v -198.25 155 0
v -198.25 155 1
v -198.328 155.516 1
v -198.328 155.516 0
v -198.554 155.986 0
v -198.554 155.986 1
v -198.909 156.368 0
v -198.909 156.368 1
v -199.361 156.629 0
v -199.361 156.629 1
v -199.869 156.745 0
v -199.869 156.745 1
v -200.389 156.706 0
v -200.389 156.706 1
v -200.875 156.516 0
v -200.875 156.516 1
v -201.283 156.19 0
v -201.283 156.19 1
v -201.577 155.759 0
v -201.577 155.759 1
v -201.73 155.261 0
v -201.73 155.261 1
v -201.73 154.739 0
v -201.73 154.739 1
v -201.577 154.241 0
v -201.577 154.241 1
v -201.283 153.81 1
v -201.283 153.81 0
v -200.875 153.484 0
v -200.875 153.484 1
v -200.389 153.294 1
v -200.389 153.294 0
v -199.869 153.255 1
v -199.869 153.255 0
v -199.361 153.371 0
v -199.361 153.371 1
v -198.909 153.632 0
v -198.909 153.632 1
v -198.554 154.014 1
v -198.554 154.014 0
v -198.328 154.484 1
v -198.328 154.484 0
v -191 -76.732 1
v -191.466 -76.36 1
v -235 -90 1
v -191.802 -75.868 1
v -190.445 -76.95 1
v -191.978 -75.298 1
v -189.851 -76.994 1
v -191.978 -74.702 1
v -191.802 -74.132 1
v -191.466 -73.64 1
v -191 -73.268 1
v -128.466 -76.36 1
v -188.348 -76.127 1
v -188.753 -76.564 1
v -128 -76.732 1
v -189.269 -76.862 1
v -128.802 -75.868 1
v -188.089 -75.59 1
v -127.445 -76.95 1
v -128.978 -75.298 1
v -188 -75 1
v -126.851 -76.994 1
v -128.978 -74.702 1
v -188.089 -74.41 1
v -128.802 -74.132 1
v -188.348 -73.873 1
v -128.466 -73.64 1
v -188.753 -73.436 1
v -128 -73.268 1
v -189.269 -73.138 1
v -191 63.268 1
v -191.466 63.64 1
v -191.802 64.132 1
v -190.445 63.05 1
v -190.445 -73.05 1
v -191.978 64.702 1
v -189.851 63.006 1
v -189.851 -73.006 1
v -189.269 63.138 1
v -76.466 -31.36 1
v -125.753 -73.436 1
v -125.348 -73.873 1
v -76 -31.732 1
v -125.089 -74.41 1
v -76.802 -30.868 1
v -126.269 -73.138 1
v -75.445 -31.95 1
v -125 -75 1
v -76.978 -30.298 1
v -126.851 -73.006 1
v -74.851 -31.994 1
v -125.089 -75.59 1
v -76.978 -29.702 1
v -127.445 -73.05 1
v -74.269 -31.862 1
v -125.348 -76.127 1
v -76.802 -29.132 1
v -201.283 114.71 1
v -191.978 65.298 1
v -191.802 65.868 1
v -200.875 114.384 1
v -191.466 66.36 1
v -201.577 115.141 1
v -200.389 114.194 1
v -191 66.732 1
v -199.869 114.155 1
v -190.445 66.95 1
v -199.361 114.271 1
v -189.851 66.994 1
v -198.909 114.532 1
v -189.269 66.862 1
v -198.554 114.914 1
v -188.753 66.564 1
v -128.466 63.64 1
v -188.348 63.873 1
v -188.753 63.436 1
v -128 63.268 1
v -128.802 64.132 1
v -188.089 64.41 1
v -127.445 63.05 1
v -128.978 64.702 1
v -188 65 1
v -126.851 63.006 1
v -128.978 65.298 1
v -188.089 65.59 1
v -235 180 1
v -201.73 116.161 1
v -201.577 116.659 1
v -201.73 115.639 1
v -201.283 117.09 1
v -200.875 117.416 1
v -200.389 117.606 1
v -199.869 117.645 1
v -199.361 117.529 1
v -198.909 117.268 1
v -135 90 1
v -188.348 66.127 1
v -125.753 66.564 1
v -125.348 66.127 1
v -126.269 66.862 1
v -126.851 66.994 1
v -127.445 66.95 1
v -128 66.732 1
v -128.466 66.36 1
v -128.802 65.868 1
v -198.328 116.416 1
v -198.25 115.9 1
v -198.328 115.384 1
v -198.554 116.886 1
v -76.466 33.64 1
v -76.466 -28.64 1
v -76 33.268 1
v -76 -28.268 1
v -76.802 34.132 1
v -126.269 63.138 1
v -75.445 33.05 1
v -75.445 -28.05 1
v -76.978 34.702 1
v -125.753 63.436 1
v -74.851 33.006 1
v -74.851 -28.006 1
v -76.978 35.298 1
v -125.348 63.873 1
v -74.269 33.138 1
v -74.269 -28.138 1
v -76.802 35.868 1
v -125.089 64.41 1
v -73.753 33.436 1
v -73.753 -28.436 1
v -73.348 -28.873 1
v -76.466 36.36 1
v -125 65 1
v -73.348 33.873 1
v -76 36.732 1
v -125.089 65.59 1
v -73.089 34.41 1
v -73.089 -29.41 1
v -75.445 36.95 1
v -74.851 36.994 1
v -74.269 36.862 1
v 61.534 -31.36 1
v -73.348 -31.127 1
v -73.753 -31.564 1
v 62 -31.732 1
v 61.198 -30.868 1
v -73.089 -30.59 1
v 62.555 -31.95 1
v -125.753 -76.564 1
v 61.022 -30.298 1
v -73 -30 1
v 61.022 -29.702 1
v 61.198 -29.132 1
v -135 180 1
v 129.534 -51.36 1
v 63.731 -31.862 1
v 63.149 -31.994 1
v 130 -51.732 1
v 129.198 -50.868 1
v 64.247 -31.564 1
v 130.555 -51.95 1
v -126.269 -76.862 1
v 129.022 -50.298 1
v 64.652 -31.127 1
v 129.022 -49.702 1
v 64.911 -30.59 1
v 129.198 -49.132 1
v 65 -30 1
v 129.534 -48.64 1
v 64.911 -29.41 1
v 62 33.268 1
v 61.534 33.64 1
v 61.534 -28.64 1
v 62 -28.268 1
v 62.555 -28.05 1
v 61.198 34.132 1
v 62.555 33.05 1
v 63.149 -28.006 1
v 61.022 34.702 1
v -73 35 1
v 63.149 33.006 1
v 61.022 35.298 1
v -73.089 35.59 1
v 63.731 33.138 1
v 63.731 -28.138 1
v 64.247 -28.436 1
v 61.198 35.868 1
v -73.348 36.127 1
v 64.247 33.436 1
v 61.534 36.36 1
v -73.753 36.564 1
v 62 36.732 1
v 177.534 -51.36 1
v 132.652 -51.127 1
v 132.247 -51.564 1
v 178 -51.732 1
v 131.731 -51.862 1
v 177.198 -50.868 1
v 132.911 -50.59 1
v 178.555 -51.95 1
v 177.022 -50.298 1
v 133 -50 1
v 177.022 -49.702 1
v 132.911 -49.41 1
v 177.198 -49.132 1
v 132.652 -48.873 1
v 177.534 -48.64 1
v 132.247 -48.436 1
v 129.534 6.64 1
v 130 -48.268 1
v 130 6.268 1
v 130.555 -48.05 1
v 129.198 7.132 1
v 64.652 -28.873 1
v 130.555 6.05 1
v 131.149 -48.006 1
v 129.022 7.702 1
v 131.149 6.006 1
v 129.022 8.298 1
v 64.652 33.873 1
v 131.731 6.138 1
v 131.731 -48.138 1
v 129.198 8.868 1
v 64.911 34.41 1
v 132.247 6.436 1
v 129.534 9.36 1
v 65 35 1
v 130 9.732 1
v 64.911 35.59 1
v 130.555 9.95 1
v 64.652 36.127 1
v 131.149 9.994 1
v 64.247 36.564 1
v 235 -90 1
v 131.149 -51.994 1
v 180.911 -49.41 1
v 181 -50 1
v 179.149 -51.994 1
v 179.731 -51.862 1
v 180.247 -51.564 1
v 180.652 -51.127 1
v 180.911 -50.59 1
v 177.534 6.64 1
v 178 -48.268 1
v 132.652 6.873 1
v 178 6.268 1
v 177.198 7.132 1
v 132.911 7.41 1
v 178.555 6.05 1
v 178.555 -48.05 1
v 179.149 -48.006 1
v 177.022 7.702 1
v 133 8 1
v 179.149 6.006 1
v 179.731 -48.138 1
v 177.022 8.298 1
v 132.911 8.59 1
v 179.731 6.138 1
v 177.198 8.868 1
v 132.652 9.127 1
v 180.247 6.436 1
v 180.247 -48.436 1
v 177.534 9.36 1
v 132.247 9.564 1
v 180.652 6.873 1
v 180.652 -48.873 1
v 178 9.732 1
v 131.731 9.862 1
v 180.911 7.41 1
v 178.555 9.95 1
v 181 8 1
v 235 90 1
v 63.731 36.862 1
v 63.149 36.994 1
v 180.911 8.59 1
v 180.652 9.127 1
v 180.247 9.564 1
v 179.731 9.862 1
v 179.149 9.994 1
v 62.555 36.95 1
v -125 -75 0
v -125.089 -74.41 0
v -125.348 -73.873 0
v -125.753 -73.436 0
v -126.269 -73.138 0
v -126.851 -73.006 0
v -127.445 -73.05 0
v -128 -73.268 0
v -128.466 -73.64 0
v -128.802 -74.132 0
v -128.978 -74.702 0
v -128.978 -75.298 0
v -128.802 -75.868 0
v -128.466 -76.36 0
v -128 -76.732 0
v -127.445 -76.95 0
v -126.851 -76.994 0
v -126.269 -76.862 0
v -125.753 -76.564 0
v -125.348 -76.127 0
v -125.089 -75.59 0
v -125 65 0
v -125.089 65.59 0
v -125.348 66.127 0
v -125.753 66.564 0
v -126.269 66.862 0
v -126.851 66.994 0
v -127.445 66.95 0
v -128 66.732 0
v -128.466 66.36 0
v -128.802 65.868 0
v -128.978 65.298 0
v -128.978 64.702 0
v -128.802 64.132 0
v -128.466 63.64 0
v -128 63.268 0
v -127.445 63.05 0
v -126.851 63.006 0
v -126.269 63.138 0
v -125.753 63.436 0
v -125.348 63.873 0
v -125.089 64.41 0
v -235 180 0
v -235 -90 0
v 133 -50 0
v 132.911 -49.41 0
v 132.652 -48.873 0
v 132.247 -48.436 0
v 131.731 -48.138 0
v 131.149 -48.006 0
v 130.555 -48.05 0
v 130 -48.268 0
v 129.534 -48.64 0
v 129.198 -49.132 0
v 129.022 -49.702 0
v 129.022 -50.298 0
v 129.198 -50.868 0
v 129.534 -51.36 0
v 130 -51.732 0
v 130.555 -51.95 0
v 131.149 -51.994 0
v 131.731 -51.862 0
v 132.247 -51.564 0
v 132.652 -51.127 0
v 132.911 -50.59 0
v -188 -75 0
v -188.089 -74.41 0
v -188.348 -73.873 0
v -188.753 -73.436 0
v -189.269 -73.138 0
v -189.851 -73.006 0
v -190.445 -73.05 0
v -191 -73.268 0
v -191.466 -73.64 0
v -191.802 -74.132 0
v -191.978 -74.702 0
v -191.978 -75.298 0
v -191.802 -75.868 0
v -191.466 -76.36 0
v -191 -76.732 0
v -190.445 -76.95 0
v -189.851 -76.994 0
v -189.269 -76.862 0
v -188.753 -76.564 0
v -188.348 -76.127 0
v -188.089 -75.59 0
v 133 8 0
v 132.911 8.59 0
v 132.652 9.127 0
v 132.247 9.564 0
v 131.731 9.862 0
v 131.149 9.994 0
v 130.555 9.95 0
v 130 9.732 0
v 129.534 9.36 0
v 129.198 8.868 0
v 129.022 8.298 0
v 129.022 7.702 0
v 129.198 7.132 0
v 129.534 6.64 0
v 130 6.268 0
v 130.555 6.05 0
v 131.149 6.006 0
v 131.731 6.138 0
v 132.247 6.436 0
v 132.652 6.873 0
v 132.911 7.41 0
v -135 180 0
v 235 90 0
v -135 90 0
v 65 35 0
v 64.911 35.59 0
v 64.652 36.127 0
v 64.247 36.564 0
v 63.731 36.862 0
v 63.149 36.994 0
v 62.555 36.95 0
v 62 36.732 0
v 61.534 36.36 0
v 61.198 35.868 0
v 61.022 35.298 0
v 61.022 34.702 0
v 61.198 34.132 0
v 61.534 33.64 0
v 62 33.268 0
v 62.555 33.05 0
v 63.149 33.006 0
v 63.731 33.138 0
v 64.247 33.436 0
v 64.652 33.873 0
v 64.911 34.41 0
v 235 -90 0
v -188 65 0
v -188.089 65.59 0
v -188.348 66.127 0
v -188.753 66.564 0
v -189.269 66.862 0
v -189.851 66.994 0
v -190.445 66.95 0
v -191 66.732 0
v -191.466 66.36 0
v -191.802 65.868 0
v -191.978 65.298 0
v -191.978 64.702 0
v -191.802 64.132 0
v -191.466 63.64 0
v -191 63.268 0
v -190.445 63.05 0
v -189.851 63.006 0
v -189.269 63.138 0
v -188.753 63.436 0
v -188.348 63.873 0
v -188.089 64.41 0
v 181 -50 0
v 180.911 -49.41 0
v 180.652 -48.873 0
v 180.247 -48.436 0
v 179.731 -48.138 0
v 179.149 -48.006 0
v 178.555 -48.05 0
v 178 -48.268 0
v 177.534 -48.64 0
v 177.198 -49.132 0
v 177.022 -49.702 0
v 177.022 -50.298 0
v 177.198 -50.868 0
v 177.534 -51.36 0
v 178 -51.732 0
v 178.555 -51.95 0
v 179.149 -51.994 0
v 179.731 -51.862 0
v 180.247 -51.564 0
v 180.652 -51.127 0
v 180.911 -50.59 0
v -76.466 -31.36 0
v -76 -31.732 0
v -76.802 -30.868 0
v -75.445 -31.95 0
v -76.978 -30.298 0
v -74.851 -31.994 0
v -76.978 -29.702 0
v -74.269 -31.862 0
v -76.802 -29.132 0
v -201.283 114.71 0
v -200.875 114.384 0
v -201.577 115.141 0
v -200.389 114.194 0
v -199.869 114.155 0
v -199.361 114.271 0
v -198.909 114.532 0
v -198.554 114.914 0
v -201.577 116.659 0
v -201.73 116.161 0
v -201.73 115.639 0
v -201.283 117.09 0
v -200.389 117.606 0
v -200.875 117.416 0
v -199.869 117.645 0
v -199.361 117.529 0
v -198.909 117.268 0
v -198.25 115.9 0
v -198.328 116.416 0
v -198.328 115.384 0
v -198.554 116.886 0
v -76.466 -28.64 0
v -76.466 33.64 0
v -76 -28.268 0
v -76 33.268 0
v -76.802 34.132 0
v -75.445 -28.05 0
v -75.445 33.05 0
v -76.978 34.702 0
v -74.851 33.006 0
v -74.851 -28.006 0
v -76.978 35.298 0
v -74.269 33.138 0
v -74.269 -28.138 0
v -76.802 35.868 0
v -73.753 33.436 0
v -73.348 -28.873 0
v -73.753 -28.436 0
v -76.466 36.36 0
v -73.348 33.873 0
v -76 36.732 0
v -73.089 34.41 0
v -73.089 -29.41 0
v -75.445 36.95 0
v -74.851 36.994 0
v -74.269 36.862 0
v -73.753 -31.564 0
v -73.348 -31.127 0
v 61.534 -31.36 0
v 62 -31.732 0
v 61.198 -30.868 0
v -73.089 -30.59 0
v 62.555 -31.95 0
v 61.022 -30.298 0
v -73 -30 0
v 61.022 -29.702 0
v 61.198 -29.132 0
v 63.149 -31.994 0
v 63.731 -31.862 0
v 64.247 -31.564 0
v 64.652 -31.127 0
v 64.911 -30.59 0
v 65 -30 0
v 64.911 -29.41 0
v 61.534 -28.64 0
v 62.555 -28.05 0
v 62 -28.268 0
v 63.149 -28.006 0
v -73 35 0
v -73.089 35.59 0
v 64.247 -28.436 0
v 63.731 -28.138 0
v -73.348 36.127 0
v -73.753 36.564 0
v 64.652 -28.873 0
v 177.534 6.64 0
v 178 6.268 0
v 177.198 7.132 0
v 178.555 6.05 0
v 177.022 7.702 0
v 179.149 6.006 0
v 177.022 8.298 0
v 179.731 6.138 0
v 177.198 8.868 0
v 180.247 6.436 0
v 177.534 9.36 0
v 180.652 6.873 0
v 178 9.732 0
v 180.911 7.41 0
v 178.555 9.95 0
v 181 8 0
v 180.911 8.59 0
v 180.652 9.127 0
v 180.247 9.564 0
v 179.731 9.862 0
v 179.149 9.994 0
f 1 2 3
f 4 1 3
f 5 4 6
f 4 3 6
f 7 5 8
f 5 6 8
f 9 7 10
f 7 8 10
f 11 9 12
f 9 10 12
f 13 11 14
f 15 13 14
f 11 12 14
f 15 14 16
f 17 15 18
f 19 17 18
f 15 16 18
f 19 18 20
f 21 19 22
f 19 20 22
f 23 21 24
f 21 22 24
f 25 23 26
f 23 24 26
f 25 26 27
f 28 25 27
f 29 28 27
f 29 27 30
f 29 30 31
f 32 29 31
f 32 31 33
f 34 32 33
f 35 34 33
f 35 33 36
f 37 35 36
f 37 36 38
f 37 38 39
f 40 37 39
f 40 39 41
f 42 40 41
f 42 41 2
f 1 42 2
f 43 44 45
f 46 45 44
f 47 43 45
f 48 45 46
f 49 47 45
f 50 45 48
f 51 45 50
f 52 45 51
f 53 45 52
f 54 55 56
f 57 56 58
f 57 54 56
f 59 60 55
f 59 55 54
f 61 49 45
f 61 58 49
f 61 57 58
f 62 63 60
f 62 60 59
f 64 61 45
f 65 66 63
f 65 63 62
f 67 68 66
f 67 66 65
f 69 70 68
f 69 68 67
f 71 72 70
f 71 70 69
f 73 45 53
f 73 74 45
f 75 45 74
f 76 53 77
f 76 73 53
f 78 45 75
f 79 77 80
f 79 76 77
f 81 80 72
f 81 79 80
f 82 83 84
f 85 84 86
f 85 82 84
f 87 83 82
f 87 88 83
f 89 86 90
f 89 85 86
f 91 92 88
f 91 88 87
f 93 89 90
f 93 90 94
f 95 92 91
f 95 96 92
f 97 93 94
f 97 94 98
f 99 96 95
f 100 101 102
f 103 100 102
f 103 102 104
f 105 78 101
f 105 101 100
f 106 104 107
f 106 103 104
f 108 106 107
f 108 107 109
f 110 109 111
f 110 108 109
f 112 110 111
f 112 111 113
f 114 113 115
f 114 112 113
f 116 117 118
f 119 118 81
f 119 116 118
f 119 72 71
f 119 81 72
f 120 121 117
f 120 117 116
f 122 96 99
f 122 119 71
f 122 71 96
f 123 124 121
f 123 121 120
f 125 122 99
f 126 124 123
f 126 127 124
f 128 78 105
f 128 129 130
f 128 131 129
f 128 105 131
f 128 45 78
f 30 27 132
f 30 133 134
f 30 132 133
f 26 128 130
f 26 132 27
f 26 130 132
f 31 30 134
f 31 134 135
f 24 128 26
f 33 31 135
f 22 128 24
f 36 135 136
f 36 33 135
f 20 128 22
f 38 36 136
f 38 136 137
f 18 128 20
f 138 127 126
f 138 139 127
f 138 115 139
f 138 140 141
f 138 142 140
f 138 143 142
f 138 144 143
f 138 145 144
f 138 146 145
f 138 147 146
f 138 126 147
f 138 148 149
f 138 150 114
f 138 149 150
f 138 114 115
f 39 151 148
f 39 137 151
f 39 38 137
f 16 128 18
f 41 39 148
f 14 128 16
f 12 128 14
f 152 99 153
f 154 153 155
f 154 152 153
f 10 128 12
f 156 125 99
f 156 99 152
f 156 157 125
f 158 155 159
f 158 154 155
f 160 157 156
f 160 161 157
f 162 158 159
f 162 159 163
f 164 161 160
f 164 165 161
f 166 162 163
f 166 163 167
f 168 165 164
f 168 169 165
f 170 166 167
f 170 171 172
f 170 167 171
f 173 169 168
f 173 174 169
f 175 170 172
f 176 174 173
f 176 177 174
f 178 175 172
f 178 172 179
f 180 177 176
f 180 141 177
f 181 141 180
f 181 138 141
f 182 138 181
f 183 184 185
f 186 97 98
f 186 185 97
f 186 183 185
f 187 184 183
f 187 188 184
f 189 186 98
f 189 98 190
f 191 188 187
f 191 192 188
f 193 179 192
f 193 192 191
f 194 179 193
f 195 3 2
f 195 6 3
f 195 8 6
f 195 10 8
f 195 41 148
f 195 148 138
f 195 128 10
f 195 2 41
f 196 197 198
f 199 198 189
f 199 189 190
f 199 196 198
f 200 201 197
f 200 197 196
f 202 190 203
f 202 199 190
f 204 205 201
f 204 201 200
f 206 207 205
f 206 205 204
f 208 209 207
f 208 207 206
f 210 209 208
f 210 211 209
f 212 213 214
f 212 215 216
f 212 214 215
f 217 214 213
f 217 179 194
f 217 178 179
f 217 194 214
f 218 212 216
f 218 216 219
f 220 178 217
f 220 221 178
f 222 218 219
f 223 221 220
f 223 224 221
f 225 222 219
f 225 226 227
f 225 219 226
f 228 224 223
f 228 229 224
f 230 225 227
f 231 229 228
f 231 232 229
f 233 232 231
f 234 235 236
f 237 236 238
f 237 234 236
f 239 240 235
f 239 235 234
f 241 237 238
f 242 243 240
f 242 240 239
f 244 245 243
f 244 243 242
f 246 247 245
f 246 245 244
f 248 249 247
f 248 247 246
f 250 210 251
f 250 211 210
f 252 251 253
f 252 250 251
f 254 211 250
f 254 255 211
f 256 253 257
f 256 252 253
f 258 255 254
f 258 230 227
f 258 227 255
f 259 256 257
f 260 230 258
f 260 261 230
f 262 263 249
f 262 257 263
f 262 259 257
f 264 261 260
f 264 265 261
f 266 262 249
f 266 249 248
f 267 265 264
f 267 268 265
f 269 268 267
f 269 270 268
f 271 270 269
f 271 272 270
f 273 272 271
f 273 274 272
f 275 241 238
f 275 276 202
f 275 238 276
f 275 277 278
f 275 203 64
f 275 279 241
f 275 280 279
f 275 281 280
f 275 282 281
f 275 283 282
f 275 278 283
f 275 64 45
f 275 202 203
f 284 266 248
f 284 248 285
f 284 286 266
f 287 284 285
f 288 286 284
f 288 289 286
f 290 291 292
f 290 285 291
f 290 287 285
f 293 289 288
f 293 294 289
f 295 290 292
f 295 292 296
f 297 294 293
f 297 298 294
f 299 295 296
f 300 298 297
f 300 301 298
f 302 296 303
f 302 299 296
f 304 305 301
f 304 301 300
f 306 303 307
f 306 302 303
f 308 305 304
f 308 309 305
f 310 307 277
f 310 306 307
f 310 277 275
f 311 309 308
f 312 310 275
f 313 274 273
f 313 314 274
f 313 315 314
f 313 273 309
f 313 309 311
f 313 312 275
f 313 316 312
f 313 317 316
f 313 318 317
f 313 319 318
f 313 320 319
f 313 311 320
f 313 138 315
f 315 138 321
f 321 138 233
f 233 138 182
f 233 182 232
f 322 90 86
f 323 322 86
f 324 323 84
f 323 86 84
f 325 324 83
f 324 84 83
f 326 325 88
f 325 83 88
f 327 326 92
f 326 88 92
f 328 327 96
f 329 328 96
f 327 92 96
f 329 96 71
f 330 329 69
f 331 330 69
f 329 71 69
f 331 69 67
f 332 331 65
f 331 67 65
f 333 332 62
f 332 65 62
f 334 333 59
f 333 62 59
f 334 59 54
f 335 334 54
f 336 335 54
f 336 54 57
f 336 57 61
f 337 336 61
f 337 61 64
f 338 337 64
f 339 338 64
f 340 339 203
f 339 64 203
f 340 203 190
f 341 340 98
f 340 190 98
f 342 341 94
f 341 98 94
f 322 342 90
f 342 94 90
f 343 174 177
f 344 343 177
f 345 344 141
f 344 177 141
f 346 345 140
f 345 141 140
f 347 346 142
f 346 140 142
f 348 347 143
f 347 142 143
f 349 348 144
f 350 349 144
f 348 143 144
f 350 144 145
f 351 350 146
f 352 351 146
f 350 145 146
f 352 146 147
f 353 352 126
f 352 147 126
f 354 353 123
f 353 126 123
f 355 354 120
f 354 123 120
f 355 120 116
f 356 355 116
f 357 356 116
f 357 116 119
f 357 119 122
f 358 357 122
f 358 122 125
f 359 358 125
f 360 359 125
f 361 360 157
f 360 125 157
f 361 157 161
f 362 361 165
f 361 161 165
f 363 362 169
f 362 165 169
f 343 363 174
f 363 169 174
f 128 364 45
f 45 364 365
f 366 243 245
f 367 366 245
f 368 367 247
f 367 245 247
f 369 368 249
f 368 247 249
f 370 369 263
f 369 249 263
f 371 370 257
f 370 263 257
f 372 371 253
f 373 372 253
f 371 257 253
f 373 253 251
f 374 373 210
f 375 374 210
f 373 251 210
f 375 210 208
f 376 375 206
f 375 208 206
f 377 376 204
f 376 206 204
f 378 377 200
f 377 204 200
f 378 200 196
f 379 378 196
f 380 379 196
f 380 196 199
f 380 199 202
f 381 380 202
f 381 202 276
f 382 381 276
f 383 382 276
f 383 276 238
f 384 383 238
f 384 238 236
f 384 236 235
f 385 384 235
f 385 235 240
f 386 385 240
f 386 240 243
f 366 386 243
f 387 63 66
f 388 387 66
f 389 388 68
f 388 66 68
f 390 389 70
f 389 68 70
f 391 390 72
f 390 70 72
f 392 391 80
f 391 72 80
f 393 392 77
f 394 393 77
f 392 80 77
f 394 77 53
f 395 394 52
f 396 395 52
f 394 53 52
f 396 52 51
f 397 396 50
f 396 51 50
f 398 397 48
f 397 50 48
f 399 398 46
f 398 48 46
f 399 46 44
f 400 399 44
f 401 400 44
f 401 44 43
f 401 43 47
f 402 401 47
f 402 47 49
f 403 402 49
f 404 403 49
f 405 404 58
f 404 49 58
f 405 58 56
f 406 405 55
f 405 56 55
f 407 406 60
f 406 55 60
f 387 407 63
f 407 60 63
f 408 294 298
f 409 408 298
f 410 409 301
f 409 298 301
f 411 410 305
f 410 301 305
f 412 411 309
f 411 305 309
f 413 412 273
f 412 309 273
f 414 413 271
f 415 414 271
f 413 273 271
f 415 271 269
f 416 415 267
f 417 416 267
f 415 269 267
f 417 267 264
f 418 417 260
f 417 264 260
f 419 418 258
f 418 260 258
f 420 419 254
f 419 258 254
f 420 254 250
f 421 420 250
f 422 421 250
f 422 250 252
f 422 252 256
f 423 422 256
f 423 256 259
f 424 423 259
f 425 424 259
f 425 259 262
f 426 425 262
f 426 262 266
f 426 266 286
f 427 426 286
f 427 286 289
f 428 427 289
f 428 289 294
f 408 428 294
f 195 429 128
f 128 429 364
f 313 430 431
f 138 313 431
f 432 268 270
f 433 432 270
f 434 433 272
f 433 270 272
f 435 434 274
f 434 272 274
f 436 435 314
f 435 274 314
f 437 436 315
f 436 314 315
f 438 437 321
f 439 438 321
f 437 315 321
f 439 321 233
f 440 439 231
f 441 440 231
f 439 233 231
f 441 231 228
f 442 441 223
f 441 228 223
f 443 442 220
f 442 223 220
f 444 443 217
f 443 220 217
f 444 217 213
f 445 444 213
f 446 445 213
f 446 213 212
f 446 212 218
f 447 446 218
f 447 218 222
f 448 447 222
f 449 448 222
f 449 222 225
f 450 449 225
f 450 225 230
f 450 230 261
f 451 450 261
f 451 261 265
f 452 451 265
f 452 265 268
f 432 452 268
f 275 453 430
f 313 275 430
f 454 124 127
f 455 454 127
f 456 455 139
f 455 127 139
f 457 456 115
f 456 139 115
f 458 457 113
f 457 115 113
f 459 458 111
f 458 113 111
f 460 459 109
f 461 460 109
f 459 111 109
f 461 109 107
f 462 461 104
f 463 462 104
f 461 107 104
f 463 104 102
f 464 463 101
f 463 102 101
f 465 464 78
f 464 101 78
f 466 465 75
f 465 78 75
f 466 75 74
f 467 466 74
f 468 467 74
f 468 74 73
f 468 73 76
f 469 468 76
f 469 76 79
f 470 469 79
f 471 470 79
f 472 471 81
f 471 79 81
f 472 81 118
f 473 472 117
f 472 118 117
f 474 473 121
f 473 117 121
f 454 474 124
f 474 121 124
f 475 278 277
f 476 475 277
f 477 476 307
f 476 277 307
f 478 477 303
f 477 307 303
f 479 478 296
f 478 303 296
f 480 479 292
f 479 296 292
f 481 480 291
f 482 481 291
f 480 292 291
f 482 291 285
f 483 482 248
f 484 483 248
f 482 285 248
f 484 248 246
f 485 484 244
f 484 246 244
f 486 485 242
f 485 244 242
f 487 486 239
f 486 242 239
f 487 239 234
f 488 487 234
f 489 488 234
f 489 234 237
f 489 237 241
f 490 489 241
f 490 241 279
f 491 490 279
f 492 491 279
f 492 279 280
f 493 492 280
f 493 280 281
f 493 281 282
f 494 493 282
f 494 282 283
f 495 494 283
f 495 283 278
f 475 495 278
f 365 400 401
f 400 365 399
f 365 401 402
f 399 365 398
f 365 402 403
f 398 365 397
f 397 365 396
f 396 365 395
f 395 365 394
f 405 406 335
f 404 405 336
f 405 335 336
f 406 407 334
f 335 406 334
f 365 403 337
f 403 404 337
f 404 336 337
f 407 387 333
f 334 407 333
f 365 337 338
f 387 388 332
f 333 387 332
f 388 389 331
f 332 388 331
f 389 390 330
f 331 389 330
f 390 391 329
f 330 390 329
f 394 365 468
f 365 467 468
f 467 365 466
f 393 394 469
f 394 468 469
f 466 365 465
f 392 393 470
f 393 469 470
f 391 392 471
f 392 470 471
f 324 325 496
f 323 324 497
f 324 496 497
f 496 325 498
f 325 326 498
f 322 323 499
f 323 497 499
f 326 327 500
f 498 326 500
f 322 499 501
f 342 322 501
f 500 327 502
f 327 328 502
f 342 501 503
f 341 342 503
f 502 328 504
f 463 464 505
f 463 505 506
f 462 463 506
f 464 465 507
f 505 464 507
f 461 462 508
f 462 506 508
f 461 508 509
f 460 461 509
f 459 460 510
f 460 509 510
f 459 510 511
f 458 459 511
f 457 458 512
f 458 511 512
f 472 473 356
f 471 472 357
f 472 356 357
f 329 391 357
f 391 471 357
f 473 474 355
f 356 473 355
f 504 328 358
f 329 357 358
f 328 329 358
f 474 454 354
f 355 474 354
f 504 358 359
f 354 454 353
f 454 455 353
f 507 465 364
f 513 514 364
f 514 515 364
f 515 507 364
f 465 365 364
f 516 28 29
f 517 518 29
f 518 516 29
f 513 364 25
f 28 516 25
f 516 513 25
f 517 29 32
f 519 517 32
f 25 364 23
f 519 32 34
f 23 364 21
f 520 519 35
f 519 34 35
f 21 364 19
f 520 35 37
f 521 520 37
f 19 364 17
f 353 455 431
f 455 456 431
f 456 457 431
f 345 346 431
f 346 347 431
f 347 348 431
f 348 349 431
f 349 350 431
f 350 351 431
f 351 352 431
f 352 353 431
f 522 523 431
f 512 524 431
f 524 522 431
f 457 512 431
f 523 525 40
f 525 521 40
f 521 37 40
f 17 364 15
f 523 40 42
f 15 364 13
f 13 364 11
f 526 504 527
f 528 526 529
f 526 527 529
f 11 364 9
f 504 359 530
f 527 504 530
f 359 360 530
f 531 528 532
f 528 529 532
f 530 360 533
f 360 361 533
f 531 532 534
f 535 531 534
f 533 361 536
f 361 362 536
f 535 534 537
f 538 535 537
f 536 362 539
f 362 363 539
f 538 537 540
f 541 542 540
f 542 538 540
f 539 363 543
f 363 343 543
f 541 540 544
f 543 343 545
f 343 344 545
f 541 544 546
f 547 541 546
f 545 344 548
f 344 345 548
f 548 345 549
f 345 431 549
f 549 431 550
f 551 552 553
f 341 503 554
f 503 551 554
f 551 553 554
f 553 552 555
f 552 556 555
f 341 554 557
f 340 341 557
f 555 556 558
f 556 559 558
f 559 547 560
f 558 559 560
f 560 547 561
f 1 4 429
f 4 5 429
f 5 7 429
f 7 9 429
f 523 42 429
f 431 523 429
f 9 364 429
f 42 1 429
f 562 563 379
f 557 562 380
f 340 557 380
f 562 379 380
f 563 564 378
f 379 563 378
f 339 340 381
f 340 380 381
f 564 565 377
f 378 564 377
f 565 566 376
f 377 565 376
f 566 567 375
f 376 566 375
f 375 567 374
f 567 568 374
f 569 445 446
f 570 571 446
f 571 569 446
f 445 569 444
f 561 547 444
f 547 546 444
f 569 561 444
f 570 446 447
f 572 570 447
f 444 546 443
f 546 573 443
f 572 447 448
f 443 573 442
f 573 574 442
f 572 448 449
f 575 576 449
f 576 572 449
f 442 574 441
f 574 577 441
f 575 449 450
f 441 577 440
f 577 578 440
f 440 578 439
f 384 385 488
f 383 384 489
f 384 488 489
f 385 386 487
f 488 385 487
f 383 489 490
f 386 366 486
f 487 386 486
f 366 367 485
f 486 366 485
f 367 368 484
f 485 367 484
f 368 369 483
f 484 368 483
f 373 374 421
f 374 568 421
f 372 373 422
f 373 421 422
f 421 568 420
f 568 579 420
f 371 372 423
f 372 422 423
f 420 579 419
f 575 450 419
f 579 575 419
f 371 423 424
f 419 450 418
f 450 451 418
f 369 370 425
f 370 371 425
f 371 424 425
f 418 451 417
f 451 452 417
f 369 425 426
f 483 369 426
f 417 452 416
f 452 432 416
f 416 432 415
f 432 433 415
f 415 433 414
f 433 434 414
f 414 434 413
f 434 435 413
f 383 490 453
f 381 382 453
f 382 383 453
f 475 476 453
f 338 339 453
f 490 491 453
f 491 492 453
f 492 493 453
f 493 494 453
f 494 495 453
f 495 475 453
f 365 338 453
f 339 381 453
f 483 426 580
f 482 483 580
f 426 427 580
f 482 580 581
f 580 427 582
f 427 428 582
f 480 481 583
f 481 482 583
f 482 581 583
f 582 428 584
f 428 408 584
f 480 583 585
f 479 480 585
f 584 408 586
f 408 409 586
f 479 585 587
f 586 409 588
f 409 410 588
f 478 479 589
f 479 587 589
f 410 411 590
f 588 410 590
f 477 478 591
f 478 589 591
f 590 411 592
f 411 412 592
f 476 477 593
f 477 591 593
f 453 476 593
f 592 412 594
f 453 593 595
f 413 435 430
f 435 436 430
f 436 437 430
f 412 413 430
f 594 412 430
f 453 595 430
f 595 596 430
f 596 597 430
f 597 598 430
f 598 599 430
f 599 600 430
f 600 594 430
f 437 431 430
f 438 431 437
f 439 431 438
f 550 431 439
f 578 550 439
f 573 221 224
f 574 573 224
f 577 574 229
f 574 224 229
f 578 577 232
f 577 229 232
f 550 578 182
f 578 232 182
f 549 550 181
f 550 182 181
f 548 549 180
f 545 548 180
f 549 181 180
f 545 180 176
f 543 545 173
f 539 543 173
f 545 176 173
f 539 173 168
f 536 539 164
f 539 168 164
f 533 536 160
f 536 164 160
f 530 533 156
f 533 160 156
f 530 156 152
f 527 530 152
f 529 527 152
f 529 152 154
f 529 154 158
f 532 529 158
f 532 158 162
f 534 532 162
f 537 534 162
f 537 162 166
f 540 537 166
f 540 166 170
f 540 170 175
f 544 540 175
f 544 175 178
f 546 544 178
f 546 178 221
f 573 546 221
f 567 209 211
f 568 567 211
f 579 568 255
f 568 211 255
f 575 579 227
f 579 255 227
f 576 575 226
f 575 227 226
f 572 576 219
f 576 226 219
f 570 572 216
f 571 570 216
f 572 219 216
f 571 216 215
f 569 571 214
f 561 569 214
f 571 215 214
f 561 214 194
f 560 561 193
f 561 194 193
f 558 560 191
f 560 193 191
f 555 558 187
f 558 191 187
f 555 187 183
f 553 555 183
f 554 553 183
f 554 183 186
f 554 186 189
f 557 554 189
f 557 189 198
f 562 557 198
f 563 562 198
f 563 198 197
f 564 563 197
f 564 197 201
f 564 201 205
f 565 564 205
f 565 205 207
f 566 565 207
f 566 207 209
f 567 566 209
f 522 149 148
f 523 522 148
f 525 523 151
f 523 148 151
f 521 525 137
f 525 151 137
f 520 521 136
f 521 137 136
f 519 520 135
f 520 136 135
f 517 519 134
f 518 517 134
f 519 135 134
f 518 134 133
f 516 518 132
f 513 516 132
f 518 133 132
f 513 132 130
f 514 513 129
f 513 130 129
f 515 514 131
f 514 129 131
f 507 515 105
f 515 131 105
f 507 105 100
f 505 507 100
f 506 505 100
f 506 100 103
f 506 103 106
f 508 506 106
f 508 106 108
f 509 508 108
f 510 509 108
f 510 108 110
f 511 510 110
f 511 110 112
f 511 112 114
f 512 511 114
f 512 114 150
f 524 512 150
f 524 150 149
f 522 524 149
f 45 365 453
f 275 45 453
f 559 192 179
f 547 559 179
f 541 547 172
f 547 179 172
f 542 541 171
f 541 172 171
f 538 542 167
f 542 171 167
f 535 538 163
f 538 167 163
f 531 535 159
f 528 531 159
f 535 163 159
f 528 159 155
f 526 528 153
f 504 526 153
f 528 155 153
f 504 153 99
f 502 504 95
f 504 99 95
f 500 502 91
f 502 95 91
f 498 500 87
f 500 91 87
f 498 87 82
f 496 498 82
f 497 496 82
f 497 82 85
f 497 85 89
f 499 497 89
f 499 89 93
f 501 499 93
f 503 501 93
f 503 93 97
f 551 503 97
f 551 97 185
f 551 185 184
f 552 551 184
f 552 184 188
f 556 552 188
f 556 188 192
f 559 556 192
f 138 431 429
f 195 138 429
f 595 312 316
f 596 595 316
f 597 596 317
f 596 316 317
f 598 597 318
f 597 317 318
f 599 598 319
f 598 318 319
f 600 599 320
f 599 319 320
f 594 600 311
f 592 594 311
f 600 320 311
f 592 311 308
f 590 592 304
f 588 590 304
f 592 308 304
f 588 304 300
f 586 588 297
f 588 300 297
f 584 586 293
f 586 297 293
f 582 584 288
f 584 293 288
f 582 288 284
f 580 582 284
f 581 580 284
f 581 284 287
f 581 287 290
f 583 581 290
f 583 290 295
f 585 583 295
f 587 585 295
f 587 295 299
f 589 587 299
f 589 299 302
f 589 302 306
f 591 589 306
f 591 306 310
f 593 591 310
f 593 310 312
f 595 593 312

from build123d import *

# Parameters (mm, degrees)
F1_DEPTH = 1
F2_R     = 2
F3_DEPTH = 1
F4_R     = 2
F5_DEPTH = 25
F6_R     = 2
F7_DEPTH = 25
F8_R     = 1.75
F9_DEPTH = 25


with BuildPart() as f1:
    # F0 (on Top) → F1 (new body)
    with BuildSketch(Plane.XY):
        Polygon((-235, 90), (-235, -90), (235, -90), (235, 90), (-135, 90), (-135, 180), (-235, 180), align=None)
    extrude(amount=F1_DEPTH)

    # F2 (on face) → F3 (cut, through all)
    with BuildSketch(Plane.XY.offset(1)):
        with Locations((-127, 65)):
            Circle(F2_R)
        with Locations((-190, 65)):
            Circle(F2_R)
        with Locations((-127, -75)):
            Circle(F2_R)
        with Locations((-190, -75)):
            Circle(F2_R)
    extrude(amount=-F3_DEPTH, mode=Mode.SUBTRACT)

    # F4 (on face) → F5 (cut)
    with BuildSketch(Plane.XY.offset(1)):
        with Locations((-75, 35)):
            Circle(F4_R)
        with Locations((63, 35)):
            Circle(F4_R)
        with Locations((-75, -30)):
            Circle(F4_R)
        with Locations((63, -30)):
            Circle(F4_R)
    extrude(amount=-F5_DEPTH, mode=Mode.SUBTRACT)

    # F6 (on face) → F7 (cut)
    with BuildSketch(Plane.XY.offset(1)):
        with Locations((131, 8)):
            Circle(F6_R)
        with Locations((131, -50)):
            Circle(F6_R)
        with Locations((179, 8)):
            Circle(F6_R)
        with Locations((179, -50)):
            Circle(F6_R)
    extrude(amount=-F7_DEPTH, mode=Mode.SUBTRACT)

    # F8 (on face) → F9 (cut)
    with BuildSketch(Plane.XY.offset(1)):
        with Locations((-200, 155)):
            Circle(F8_R)
        with Locations((-200, 115.9)):
            Circle(F8_R)
    extrude(amount=-F9_DEPTH, mode=Mode.SUBTRACT)


solid = f1.part
